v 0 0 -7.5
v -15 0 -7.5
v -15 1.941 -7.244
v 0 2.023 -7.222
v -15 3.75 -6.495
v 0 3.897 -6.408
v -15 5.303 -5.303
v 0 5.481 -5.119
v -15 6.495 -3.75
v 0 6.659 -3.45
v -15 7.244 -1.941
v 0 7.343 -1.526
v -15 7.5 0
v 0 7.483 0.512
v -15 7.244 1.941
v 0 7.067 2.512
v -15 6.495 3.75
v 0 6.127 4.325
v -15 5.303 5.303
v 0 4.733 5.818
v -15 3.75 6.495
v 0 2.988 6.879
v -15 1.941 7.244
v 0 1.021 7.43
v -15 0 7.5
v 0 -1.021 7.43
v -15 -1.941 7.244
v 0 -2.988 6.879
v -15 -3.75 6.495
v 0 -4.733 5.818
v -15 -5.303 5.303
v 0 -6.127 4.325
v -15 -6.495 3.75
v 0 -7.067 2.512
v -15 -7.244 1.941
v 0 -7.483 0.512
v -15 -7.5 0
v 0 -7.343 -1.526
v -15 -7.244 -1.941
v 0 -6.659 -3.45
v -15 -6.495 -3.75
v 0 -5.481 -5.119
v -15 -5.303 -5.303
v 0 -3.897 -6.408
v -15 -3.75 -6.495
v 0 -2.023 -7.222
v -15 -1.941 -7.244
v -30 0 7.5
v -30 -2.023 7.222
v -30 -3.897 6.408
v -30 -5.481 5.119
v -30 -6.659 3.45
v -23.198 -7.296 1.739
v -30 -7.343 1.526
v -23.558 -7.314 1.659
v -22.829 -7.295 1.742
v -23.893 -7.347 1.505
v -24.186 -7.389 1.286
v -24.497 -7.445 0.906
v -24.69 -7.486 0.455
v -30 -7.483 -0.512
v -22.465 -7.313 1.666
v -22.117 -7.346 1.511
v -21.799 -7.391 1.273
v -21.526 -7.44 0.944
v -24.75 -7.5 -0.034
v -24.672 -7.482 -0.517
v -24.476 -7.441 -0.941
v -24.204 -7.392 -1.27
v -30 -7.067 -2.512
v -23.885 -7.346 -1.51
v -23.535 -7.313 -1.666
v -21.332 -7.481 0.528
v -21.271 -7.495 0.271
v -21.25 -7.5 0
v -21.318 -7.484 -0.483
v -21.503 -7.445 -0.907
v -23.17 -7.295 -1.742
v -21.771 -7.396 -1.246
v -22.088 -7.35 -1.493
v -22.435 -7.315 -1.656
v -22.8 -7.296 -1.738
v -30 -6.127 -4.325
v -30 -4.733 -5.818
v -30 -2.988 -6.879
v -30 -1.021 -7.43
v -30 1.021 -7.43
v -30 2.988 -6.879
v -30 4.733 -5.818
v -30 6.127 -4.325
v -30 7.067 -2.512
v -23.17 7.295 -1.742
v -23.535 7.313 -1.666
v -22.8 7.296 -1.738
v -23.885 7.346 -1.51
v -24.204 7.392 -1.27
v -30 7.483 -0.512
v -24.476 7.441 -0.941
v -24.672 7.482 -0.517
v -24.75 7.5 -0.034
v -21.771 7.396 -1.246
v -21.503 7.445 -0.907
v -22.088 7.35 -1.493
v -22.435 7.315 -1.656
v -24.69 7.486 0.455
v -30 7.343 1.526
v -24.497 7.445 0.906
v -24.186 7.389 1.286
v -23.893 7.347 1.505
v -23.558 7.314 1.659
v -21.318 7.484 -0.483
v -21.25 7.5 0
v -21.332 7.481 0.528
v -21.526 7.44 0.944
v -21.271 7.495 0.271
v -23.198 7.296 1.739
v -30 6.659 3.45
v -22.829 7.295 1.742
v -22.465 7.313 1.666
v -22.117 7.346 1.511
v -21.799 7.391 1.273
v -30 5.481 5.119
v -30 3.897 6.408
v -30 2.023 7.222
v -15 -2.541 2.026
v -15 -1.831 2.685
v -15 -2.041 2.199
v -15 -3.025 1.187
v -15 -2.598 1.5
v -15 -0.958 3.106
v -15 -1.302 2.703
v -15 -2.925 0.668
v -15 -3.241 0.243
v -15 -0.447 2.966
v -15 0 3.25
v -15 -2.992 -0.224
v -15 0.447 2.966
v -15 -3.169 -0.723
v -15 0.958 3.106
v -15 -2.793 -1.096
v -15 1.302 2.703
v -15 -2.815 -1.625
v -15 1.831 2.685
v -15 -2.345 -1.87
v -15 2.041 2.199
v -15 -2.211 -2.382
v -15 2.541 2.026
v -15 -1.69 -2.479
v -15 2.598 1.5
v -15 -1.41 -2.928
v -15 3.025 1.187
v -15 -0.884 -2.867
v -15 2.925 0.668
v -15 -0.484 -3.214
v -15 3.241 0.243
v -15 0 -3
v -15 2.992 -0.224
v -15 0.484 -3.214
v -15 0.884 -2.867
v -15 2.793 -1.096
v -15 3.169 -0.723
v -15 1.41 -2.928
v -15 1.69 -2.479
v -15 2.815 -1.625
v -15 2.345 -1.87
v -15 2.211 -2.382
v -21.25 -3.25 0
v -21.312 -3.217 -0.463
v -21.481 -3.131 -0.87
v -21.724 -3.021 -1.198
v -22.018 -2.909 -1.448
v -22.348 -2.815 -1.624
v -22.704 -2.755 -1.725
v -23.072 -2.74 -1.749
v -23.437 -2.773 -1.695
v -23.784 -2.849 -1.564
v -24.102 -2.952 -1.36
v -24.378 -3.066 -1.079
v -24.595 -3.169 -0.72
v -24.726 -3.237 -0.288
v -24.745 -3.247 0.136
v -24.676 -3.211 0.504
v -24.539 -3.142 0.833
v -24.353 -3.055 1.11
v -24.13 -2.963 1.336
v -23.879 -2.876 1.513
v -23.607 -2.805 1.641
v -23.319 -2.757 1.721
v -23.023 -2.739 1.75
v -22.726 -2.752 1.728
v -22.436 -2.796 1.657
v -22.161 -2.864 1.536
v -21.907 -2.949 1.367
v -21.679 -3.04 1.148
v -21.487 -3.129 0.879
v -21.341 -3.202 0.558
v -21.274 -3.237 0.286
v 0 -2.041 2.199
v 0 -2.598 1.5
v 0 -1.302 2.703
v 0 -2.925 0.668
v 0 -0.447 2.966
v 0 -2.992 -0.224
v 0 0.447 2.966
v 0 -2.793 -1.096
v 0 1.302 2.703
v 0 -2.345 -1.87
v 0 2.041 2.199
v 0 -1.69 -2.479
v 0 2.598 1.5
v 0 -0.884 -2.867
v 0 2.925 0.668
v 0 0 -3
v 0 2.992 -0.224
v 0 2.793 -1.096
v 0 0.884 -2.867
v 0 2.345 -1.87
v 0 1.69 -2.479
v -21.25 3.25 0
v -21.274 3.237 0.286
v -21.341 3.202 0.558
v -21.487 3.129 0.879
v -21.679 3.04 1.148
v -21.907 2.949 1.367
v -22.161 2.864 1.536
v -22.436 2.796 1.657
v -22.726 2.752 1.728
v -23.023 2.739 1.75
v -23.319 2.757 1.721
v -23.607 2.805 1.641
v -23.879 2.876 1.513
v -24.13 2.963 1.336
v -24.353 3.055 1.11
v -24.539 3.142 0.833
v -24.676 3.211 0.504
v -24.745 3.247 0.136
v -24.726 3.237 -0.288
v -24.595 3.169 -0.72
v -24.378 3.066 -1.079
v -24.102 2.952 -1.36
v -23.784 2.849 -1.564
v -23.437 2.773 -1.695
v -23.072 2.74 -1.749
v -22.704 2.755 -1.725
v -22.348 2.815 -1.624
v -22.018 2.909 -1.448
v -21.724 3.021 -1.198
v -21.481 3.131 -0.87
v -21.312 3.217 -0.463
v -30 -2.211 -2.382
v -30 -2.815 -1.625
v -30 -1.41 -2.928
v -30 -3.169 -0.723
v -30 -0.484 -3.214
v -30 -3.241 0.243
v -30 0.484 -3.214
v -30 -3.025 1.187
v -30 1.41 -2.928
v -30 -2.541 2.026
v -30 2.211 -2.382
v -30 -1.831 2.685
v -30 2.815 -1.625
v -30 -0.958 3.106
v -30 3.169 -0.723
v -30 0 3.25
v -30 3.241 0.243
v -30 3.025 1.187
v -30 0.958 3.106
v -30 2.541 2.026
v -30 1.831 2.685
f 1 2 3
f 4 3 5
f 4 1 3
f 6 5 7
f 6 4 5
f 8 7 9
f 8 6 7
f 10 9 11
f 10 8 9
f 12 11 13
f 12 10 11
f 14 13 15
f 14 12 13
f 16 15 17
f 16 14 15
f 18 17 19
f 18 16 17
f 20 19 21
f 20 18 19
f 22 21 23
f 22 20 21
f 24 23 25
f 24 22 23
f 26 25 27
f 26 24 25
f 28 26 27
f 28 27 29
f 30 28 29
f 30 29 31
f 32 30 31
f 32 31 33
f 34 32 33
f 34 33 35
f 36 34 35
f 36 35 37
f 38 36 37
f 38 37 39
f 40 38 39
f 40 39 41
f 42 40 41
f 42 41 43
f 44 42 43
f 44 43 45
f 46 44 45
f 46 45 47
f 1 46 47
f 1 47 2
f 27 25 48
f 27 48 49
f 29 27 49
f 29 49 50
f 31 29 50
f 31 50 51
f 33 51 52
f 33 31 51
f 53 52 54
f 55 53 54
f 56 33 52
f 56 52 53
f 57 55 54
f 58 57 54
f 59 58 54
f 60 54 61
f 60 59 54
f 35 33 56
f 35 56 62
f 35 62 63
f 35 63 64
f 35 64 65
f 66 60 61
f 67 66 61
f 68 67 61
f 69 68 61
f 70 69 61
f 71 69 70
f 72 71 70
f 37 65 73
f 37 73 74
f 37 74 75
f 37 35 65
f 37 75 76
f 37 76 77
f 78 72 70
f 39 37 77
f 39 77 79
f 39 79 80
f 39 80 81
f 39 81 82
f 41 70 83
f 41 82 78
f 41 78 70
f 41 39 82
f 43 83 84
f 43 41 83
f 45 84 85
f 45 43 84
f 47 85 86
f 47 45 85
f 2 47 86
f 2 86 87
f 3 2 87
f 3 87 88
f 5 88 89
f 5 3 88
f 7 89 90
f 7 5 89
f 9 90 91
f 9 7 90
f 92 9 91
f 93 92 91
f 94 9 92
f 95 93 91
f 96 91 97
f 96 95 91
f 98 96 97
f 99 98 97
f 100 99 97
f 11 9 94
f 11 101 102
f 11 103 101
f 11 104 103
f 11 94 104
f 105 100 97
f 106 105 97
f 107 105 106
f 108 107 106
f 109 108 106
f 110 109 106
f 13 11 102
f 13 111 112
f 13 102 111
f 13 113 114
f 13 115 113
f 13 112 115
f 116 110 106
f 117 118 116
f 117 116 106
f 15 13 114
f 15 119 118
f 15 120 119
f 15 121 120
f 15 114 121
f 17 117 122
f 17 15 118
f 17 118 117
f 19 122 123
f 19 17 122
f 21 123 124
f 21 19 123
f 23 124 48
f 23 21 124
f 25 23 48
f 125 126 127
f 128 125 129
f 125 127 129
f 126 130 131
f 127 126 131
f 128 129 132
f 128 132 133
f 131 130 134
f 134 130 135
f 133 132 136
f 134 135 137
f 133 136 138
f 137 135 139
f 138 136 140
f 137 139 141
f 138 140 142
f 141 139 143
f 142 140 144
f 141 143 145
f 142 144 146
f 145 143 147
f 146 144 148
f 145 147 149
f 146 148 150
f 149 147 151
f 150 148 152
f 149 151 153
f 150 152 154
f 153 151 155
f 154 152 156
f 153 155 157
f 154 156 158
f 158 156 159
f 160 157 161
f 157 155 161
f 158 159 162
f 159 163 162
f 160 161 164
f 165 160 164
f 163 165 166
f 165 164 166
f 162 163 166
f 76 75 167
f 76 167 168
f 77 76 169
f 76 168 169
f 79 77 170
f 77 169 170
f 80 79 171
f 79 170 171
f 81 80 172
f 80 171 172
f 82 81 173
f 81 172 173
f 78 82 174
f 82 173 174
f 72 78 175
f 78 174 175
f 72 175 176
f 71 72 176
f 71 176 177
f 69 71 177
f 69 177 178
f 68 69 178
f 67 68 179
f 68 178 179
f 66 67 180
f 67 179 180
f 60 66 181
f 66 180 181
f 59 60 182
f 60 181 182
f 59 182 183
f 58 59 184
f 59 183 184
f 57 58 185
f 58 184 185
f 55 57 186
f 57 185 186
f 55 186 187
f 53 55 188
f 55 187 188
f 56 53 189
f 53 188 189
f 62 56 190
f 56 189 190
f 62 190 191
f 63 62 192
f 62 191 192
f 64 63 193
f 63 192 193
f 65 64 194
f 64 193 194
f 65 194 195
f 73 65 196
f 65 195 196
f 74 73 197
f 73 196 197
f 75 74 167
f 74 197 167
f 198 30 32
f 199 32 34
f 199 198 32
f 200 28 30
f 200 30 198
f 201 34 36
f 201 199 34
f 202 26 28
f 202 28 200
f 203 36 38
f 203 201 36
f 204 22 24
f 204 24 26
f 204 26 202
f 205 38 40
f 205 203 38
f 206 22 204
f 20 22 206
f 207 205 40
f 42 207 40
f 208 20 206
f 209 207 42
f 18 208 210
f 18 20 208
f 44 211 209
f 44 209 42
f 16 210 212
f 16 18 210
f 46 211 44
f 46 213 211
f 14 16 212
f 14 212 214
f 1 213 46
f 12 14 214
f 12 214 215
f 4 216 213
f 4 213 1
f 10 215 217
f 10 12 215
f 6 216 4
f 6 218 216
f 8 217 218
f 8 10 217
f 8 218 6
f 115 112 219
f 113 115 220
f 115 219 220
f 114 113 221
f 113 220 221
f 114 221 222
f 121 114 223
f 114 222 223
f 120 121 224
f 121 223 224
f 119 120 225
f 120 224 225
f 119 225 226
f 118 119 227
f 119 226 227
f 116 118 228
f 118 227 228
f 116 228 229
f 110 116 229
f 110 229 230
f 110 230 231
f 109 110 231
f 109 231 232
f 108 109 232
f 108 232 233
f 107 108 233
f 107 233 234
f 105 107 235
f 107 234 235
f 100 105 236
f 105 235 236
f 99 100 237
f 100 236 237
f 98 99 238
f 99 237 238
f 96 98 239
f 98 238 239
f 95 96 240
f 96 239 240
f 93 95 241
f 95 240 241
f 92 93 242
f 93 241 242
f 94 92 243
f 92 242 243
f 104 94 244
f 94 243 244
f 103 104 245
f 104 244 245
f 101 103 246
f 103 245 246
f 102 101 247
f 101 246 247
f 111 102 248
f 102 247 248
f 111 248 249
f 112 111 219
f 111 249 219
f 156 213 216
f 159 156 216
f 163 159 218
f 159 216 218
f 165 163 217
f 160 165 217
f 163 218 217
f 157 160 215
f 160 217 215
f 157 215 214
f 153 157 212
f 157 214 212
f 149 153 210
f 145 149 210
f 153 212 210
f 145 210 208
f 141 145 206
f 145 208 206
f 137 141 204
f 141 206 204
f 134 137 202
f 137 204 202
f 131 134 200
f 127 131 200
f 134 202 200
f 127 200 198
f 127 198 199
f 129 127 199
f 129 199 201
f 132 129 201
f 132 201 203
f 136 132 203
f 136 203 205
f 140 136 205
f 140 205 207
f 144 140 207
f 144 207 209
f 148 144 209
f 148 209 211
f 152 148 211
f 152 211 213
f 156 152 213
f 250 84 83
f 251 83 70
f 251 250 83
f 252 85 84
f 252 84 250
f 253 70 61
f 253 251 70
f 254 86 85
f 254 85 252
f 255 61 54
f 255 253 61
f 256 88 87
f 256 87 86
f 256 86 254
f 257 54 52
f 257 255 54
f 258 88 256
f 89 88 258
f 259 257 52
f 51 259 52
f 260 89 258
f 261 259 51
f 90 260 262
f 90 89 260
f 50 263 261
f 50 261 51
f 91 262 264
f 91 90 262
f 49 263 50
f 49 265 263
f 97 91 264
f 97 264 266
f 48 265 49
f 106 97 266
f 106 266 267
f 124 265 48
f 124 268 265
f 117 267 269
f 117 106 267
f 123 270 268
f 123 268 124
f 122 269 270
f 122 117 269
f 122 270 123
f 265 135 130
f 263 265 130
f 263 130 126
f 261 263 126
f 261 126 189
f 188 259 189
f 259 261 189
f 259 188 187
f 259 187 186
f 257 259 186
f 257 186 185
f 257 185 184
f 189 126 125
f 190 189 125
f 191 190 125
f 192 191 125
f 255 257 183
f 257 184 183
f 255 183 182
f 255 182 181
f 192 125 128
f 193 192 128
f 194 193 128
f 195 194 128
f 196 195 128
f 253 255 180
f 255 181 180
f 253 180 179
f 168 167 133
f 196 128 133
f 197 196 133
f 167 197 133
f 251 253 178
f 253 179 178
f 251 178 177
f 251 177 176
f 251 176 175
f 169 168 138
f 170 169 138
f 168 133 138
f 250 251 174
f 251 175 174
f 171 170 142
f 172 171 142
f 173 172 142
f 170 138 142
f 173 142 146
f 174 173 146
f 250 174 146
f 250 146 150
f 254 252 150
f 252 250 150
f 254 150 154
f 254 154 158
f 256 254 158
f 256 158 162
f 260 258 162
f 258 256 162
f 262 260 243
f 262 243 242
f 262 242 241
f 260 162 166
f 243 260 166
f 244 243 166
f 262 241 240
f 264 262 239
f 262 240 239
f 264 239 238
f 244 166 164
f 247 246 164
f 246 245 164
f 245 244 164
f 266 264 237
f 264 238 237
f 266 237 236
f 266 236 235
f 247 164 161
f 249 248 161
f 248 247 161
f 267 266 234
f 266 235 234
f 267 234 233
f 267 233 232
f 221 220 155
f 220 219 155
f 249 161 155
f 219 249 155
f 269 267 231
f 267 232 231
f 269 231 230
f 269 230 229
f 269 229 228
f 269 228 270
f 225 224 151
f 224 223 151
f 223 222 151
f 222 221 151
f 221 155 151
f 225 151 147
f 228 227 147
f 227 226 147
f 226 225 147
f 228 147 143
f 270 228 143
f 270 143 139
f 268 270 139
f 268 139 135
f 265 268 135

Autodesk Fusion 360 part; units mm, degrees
sketch "Sketch1" plane through (0, 0, 0) normal (1, 0, 0) x (0, 0, -1)
  circle A0 centre (0, 0) radius 3
  circle A1 centre (0, 0) radius 7.5
  dimension "d1" = 6
  dimension "d2" = 15
extrude "Extrude1" add sketch "Sketch1" against normal blind 15
sketch "Sketch2" plane through (-15, 0, 0) normal (-1, 0, 0) x (0, 0, 1)
  circle A0 centre (0, 0) radius 7.5
  circle A1 centre (0, 0) radius 3.25
  circle A2 centre (0, 0) radius 7.5
  dimension "d5" = 6.5
extrude "Extrude2" add sketch "Sketch2" along normal blind 15
sketch "Sketch3" plane through (0, 0, 0) normal (0, 1, 0) x (1, 0, 0)
  line L0 (-30, 7.5) -> (-30, -7.5)
  line L1 (0, -7.5) -> (0, 7.5)
  circle A0 centre (-23, 0) radius 1.75
  point P0 (-23, 0)
  dimension "d8" = 30
extrude "Extrude3" cut sketch "Sketch3" along normal mid plane 38
